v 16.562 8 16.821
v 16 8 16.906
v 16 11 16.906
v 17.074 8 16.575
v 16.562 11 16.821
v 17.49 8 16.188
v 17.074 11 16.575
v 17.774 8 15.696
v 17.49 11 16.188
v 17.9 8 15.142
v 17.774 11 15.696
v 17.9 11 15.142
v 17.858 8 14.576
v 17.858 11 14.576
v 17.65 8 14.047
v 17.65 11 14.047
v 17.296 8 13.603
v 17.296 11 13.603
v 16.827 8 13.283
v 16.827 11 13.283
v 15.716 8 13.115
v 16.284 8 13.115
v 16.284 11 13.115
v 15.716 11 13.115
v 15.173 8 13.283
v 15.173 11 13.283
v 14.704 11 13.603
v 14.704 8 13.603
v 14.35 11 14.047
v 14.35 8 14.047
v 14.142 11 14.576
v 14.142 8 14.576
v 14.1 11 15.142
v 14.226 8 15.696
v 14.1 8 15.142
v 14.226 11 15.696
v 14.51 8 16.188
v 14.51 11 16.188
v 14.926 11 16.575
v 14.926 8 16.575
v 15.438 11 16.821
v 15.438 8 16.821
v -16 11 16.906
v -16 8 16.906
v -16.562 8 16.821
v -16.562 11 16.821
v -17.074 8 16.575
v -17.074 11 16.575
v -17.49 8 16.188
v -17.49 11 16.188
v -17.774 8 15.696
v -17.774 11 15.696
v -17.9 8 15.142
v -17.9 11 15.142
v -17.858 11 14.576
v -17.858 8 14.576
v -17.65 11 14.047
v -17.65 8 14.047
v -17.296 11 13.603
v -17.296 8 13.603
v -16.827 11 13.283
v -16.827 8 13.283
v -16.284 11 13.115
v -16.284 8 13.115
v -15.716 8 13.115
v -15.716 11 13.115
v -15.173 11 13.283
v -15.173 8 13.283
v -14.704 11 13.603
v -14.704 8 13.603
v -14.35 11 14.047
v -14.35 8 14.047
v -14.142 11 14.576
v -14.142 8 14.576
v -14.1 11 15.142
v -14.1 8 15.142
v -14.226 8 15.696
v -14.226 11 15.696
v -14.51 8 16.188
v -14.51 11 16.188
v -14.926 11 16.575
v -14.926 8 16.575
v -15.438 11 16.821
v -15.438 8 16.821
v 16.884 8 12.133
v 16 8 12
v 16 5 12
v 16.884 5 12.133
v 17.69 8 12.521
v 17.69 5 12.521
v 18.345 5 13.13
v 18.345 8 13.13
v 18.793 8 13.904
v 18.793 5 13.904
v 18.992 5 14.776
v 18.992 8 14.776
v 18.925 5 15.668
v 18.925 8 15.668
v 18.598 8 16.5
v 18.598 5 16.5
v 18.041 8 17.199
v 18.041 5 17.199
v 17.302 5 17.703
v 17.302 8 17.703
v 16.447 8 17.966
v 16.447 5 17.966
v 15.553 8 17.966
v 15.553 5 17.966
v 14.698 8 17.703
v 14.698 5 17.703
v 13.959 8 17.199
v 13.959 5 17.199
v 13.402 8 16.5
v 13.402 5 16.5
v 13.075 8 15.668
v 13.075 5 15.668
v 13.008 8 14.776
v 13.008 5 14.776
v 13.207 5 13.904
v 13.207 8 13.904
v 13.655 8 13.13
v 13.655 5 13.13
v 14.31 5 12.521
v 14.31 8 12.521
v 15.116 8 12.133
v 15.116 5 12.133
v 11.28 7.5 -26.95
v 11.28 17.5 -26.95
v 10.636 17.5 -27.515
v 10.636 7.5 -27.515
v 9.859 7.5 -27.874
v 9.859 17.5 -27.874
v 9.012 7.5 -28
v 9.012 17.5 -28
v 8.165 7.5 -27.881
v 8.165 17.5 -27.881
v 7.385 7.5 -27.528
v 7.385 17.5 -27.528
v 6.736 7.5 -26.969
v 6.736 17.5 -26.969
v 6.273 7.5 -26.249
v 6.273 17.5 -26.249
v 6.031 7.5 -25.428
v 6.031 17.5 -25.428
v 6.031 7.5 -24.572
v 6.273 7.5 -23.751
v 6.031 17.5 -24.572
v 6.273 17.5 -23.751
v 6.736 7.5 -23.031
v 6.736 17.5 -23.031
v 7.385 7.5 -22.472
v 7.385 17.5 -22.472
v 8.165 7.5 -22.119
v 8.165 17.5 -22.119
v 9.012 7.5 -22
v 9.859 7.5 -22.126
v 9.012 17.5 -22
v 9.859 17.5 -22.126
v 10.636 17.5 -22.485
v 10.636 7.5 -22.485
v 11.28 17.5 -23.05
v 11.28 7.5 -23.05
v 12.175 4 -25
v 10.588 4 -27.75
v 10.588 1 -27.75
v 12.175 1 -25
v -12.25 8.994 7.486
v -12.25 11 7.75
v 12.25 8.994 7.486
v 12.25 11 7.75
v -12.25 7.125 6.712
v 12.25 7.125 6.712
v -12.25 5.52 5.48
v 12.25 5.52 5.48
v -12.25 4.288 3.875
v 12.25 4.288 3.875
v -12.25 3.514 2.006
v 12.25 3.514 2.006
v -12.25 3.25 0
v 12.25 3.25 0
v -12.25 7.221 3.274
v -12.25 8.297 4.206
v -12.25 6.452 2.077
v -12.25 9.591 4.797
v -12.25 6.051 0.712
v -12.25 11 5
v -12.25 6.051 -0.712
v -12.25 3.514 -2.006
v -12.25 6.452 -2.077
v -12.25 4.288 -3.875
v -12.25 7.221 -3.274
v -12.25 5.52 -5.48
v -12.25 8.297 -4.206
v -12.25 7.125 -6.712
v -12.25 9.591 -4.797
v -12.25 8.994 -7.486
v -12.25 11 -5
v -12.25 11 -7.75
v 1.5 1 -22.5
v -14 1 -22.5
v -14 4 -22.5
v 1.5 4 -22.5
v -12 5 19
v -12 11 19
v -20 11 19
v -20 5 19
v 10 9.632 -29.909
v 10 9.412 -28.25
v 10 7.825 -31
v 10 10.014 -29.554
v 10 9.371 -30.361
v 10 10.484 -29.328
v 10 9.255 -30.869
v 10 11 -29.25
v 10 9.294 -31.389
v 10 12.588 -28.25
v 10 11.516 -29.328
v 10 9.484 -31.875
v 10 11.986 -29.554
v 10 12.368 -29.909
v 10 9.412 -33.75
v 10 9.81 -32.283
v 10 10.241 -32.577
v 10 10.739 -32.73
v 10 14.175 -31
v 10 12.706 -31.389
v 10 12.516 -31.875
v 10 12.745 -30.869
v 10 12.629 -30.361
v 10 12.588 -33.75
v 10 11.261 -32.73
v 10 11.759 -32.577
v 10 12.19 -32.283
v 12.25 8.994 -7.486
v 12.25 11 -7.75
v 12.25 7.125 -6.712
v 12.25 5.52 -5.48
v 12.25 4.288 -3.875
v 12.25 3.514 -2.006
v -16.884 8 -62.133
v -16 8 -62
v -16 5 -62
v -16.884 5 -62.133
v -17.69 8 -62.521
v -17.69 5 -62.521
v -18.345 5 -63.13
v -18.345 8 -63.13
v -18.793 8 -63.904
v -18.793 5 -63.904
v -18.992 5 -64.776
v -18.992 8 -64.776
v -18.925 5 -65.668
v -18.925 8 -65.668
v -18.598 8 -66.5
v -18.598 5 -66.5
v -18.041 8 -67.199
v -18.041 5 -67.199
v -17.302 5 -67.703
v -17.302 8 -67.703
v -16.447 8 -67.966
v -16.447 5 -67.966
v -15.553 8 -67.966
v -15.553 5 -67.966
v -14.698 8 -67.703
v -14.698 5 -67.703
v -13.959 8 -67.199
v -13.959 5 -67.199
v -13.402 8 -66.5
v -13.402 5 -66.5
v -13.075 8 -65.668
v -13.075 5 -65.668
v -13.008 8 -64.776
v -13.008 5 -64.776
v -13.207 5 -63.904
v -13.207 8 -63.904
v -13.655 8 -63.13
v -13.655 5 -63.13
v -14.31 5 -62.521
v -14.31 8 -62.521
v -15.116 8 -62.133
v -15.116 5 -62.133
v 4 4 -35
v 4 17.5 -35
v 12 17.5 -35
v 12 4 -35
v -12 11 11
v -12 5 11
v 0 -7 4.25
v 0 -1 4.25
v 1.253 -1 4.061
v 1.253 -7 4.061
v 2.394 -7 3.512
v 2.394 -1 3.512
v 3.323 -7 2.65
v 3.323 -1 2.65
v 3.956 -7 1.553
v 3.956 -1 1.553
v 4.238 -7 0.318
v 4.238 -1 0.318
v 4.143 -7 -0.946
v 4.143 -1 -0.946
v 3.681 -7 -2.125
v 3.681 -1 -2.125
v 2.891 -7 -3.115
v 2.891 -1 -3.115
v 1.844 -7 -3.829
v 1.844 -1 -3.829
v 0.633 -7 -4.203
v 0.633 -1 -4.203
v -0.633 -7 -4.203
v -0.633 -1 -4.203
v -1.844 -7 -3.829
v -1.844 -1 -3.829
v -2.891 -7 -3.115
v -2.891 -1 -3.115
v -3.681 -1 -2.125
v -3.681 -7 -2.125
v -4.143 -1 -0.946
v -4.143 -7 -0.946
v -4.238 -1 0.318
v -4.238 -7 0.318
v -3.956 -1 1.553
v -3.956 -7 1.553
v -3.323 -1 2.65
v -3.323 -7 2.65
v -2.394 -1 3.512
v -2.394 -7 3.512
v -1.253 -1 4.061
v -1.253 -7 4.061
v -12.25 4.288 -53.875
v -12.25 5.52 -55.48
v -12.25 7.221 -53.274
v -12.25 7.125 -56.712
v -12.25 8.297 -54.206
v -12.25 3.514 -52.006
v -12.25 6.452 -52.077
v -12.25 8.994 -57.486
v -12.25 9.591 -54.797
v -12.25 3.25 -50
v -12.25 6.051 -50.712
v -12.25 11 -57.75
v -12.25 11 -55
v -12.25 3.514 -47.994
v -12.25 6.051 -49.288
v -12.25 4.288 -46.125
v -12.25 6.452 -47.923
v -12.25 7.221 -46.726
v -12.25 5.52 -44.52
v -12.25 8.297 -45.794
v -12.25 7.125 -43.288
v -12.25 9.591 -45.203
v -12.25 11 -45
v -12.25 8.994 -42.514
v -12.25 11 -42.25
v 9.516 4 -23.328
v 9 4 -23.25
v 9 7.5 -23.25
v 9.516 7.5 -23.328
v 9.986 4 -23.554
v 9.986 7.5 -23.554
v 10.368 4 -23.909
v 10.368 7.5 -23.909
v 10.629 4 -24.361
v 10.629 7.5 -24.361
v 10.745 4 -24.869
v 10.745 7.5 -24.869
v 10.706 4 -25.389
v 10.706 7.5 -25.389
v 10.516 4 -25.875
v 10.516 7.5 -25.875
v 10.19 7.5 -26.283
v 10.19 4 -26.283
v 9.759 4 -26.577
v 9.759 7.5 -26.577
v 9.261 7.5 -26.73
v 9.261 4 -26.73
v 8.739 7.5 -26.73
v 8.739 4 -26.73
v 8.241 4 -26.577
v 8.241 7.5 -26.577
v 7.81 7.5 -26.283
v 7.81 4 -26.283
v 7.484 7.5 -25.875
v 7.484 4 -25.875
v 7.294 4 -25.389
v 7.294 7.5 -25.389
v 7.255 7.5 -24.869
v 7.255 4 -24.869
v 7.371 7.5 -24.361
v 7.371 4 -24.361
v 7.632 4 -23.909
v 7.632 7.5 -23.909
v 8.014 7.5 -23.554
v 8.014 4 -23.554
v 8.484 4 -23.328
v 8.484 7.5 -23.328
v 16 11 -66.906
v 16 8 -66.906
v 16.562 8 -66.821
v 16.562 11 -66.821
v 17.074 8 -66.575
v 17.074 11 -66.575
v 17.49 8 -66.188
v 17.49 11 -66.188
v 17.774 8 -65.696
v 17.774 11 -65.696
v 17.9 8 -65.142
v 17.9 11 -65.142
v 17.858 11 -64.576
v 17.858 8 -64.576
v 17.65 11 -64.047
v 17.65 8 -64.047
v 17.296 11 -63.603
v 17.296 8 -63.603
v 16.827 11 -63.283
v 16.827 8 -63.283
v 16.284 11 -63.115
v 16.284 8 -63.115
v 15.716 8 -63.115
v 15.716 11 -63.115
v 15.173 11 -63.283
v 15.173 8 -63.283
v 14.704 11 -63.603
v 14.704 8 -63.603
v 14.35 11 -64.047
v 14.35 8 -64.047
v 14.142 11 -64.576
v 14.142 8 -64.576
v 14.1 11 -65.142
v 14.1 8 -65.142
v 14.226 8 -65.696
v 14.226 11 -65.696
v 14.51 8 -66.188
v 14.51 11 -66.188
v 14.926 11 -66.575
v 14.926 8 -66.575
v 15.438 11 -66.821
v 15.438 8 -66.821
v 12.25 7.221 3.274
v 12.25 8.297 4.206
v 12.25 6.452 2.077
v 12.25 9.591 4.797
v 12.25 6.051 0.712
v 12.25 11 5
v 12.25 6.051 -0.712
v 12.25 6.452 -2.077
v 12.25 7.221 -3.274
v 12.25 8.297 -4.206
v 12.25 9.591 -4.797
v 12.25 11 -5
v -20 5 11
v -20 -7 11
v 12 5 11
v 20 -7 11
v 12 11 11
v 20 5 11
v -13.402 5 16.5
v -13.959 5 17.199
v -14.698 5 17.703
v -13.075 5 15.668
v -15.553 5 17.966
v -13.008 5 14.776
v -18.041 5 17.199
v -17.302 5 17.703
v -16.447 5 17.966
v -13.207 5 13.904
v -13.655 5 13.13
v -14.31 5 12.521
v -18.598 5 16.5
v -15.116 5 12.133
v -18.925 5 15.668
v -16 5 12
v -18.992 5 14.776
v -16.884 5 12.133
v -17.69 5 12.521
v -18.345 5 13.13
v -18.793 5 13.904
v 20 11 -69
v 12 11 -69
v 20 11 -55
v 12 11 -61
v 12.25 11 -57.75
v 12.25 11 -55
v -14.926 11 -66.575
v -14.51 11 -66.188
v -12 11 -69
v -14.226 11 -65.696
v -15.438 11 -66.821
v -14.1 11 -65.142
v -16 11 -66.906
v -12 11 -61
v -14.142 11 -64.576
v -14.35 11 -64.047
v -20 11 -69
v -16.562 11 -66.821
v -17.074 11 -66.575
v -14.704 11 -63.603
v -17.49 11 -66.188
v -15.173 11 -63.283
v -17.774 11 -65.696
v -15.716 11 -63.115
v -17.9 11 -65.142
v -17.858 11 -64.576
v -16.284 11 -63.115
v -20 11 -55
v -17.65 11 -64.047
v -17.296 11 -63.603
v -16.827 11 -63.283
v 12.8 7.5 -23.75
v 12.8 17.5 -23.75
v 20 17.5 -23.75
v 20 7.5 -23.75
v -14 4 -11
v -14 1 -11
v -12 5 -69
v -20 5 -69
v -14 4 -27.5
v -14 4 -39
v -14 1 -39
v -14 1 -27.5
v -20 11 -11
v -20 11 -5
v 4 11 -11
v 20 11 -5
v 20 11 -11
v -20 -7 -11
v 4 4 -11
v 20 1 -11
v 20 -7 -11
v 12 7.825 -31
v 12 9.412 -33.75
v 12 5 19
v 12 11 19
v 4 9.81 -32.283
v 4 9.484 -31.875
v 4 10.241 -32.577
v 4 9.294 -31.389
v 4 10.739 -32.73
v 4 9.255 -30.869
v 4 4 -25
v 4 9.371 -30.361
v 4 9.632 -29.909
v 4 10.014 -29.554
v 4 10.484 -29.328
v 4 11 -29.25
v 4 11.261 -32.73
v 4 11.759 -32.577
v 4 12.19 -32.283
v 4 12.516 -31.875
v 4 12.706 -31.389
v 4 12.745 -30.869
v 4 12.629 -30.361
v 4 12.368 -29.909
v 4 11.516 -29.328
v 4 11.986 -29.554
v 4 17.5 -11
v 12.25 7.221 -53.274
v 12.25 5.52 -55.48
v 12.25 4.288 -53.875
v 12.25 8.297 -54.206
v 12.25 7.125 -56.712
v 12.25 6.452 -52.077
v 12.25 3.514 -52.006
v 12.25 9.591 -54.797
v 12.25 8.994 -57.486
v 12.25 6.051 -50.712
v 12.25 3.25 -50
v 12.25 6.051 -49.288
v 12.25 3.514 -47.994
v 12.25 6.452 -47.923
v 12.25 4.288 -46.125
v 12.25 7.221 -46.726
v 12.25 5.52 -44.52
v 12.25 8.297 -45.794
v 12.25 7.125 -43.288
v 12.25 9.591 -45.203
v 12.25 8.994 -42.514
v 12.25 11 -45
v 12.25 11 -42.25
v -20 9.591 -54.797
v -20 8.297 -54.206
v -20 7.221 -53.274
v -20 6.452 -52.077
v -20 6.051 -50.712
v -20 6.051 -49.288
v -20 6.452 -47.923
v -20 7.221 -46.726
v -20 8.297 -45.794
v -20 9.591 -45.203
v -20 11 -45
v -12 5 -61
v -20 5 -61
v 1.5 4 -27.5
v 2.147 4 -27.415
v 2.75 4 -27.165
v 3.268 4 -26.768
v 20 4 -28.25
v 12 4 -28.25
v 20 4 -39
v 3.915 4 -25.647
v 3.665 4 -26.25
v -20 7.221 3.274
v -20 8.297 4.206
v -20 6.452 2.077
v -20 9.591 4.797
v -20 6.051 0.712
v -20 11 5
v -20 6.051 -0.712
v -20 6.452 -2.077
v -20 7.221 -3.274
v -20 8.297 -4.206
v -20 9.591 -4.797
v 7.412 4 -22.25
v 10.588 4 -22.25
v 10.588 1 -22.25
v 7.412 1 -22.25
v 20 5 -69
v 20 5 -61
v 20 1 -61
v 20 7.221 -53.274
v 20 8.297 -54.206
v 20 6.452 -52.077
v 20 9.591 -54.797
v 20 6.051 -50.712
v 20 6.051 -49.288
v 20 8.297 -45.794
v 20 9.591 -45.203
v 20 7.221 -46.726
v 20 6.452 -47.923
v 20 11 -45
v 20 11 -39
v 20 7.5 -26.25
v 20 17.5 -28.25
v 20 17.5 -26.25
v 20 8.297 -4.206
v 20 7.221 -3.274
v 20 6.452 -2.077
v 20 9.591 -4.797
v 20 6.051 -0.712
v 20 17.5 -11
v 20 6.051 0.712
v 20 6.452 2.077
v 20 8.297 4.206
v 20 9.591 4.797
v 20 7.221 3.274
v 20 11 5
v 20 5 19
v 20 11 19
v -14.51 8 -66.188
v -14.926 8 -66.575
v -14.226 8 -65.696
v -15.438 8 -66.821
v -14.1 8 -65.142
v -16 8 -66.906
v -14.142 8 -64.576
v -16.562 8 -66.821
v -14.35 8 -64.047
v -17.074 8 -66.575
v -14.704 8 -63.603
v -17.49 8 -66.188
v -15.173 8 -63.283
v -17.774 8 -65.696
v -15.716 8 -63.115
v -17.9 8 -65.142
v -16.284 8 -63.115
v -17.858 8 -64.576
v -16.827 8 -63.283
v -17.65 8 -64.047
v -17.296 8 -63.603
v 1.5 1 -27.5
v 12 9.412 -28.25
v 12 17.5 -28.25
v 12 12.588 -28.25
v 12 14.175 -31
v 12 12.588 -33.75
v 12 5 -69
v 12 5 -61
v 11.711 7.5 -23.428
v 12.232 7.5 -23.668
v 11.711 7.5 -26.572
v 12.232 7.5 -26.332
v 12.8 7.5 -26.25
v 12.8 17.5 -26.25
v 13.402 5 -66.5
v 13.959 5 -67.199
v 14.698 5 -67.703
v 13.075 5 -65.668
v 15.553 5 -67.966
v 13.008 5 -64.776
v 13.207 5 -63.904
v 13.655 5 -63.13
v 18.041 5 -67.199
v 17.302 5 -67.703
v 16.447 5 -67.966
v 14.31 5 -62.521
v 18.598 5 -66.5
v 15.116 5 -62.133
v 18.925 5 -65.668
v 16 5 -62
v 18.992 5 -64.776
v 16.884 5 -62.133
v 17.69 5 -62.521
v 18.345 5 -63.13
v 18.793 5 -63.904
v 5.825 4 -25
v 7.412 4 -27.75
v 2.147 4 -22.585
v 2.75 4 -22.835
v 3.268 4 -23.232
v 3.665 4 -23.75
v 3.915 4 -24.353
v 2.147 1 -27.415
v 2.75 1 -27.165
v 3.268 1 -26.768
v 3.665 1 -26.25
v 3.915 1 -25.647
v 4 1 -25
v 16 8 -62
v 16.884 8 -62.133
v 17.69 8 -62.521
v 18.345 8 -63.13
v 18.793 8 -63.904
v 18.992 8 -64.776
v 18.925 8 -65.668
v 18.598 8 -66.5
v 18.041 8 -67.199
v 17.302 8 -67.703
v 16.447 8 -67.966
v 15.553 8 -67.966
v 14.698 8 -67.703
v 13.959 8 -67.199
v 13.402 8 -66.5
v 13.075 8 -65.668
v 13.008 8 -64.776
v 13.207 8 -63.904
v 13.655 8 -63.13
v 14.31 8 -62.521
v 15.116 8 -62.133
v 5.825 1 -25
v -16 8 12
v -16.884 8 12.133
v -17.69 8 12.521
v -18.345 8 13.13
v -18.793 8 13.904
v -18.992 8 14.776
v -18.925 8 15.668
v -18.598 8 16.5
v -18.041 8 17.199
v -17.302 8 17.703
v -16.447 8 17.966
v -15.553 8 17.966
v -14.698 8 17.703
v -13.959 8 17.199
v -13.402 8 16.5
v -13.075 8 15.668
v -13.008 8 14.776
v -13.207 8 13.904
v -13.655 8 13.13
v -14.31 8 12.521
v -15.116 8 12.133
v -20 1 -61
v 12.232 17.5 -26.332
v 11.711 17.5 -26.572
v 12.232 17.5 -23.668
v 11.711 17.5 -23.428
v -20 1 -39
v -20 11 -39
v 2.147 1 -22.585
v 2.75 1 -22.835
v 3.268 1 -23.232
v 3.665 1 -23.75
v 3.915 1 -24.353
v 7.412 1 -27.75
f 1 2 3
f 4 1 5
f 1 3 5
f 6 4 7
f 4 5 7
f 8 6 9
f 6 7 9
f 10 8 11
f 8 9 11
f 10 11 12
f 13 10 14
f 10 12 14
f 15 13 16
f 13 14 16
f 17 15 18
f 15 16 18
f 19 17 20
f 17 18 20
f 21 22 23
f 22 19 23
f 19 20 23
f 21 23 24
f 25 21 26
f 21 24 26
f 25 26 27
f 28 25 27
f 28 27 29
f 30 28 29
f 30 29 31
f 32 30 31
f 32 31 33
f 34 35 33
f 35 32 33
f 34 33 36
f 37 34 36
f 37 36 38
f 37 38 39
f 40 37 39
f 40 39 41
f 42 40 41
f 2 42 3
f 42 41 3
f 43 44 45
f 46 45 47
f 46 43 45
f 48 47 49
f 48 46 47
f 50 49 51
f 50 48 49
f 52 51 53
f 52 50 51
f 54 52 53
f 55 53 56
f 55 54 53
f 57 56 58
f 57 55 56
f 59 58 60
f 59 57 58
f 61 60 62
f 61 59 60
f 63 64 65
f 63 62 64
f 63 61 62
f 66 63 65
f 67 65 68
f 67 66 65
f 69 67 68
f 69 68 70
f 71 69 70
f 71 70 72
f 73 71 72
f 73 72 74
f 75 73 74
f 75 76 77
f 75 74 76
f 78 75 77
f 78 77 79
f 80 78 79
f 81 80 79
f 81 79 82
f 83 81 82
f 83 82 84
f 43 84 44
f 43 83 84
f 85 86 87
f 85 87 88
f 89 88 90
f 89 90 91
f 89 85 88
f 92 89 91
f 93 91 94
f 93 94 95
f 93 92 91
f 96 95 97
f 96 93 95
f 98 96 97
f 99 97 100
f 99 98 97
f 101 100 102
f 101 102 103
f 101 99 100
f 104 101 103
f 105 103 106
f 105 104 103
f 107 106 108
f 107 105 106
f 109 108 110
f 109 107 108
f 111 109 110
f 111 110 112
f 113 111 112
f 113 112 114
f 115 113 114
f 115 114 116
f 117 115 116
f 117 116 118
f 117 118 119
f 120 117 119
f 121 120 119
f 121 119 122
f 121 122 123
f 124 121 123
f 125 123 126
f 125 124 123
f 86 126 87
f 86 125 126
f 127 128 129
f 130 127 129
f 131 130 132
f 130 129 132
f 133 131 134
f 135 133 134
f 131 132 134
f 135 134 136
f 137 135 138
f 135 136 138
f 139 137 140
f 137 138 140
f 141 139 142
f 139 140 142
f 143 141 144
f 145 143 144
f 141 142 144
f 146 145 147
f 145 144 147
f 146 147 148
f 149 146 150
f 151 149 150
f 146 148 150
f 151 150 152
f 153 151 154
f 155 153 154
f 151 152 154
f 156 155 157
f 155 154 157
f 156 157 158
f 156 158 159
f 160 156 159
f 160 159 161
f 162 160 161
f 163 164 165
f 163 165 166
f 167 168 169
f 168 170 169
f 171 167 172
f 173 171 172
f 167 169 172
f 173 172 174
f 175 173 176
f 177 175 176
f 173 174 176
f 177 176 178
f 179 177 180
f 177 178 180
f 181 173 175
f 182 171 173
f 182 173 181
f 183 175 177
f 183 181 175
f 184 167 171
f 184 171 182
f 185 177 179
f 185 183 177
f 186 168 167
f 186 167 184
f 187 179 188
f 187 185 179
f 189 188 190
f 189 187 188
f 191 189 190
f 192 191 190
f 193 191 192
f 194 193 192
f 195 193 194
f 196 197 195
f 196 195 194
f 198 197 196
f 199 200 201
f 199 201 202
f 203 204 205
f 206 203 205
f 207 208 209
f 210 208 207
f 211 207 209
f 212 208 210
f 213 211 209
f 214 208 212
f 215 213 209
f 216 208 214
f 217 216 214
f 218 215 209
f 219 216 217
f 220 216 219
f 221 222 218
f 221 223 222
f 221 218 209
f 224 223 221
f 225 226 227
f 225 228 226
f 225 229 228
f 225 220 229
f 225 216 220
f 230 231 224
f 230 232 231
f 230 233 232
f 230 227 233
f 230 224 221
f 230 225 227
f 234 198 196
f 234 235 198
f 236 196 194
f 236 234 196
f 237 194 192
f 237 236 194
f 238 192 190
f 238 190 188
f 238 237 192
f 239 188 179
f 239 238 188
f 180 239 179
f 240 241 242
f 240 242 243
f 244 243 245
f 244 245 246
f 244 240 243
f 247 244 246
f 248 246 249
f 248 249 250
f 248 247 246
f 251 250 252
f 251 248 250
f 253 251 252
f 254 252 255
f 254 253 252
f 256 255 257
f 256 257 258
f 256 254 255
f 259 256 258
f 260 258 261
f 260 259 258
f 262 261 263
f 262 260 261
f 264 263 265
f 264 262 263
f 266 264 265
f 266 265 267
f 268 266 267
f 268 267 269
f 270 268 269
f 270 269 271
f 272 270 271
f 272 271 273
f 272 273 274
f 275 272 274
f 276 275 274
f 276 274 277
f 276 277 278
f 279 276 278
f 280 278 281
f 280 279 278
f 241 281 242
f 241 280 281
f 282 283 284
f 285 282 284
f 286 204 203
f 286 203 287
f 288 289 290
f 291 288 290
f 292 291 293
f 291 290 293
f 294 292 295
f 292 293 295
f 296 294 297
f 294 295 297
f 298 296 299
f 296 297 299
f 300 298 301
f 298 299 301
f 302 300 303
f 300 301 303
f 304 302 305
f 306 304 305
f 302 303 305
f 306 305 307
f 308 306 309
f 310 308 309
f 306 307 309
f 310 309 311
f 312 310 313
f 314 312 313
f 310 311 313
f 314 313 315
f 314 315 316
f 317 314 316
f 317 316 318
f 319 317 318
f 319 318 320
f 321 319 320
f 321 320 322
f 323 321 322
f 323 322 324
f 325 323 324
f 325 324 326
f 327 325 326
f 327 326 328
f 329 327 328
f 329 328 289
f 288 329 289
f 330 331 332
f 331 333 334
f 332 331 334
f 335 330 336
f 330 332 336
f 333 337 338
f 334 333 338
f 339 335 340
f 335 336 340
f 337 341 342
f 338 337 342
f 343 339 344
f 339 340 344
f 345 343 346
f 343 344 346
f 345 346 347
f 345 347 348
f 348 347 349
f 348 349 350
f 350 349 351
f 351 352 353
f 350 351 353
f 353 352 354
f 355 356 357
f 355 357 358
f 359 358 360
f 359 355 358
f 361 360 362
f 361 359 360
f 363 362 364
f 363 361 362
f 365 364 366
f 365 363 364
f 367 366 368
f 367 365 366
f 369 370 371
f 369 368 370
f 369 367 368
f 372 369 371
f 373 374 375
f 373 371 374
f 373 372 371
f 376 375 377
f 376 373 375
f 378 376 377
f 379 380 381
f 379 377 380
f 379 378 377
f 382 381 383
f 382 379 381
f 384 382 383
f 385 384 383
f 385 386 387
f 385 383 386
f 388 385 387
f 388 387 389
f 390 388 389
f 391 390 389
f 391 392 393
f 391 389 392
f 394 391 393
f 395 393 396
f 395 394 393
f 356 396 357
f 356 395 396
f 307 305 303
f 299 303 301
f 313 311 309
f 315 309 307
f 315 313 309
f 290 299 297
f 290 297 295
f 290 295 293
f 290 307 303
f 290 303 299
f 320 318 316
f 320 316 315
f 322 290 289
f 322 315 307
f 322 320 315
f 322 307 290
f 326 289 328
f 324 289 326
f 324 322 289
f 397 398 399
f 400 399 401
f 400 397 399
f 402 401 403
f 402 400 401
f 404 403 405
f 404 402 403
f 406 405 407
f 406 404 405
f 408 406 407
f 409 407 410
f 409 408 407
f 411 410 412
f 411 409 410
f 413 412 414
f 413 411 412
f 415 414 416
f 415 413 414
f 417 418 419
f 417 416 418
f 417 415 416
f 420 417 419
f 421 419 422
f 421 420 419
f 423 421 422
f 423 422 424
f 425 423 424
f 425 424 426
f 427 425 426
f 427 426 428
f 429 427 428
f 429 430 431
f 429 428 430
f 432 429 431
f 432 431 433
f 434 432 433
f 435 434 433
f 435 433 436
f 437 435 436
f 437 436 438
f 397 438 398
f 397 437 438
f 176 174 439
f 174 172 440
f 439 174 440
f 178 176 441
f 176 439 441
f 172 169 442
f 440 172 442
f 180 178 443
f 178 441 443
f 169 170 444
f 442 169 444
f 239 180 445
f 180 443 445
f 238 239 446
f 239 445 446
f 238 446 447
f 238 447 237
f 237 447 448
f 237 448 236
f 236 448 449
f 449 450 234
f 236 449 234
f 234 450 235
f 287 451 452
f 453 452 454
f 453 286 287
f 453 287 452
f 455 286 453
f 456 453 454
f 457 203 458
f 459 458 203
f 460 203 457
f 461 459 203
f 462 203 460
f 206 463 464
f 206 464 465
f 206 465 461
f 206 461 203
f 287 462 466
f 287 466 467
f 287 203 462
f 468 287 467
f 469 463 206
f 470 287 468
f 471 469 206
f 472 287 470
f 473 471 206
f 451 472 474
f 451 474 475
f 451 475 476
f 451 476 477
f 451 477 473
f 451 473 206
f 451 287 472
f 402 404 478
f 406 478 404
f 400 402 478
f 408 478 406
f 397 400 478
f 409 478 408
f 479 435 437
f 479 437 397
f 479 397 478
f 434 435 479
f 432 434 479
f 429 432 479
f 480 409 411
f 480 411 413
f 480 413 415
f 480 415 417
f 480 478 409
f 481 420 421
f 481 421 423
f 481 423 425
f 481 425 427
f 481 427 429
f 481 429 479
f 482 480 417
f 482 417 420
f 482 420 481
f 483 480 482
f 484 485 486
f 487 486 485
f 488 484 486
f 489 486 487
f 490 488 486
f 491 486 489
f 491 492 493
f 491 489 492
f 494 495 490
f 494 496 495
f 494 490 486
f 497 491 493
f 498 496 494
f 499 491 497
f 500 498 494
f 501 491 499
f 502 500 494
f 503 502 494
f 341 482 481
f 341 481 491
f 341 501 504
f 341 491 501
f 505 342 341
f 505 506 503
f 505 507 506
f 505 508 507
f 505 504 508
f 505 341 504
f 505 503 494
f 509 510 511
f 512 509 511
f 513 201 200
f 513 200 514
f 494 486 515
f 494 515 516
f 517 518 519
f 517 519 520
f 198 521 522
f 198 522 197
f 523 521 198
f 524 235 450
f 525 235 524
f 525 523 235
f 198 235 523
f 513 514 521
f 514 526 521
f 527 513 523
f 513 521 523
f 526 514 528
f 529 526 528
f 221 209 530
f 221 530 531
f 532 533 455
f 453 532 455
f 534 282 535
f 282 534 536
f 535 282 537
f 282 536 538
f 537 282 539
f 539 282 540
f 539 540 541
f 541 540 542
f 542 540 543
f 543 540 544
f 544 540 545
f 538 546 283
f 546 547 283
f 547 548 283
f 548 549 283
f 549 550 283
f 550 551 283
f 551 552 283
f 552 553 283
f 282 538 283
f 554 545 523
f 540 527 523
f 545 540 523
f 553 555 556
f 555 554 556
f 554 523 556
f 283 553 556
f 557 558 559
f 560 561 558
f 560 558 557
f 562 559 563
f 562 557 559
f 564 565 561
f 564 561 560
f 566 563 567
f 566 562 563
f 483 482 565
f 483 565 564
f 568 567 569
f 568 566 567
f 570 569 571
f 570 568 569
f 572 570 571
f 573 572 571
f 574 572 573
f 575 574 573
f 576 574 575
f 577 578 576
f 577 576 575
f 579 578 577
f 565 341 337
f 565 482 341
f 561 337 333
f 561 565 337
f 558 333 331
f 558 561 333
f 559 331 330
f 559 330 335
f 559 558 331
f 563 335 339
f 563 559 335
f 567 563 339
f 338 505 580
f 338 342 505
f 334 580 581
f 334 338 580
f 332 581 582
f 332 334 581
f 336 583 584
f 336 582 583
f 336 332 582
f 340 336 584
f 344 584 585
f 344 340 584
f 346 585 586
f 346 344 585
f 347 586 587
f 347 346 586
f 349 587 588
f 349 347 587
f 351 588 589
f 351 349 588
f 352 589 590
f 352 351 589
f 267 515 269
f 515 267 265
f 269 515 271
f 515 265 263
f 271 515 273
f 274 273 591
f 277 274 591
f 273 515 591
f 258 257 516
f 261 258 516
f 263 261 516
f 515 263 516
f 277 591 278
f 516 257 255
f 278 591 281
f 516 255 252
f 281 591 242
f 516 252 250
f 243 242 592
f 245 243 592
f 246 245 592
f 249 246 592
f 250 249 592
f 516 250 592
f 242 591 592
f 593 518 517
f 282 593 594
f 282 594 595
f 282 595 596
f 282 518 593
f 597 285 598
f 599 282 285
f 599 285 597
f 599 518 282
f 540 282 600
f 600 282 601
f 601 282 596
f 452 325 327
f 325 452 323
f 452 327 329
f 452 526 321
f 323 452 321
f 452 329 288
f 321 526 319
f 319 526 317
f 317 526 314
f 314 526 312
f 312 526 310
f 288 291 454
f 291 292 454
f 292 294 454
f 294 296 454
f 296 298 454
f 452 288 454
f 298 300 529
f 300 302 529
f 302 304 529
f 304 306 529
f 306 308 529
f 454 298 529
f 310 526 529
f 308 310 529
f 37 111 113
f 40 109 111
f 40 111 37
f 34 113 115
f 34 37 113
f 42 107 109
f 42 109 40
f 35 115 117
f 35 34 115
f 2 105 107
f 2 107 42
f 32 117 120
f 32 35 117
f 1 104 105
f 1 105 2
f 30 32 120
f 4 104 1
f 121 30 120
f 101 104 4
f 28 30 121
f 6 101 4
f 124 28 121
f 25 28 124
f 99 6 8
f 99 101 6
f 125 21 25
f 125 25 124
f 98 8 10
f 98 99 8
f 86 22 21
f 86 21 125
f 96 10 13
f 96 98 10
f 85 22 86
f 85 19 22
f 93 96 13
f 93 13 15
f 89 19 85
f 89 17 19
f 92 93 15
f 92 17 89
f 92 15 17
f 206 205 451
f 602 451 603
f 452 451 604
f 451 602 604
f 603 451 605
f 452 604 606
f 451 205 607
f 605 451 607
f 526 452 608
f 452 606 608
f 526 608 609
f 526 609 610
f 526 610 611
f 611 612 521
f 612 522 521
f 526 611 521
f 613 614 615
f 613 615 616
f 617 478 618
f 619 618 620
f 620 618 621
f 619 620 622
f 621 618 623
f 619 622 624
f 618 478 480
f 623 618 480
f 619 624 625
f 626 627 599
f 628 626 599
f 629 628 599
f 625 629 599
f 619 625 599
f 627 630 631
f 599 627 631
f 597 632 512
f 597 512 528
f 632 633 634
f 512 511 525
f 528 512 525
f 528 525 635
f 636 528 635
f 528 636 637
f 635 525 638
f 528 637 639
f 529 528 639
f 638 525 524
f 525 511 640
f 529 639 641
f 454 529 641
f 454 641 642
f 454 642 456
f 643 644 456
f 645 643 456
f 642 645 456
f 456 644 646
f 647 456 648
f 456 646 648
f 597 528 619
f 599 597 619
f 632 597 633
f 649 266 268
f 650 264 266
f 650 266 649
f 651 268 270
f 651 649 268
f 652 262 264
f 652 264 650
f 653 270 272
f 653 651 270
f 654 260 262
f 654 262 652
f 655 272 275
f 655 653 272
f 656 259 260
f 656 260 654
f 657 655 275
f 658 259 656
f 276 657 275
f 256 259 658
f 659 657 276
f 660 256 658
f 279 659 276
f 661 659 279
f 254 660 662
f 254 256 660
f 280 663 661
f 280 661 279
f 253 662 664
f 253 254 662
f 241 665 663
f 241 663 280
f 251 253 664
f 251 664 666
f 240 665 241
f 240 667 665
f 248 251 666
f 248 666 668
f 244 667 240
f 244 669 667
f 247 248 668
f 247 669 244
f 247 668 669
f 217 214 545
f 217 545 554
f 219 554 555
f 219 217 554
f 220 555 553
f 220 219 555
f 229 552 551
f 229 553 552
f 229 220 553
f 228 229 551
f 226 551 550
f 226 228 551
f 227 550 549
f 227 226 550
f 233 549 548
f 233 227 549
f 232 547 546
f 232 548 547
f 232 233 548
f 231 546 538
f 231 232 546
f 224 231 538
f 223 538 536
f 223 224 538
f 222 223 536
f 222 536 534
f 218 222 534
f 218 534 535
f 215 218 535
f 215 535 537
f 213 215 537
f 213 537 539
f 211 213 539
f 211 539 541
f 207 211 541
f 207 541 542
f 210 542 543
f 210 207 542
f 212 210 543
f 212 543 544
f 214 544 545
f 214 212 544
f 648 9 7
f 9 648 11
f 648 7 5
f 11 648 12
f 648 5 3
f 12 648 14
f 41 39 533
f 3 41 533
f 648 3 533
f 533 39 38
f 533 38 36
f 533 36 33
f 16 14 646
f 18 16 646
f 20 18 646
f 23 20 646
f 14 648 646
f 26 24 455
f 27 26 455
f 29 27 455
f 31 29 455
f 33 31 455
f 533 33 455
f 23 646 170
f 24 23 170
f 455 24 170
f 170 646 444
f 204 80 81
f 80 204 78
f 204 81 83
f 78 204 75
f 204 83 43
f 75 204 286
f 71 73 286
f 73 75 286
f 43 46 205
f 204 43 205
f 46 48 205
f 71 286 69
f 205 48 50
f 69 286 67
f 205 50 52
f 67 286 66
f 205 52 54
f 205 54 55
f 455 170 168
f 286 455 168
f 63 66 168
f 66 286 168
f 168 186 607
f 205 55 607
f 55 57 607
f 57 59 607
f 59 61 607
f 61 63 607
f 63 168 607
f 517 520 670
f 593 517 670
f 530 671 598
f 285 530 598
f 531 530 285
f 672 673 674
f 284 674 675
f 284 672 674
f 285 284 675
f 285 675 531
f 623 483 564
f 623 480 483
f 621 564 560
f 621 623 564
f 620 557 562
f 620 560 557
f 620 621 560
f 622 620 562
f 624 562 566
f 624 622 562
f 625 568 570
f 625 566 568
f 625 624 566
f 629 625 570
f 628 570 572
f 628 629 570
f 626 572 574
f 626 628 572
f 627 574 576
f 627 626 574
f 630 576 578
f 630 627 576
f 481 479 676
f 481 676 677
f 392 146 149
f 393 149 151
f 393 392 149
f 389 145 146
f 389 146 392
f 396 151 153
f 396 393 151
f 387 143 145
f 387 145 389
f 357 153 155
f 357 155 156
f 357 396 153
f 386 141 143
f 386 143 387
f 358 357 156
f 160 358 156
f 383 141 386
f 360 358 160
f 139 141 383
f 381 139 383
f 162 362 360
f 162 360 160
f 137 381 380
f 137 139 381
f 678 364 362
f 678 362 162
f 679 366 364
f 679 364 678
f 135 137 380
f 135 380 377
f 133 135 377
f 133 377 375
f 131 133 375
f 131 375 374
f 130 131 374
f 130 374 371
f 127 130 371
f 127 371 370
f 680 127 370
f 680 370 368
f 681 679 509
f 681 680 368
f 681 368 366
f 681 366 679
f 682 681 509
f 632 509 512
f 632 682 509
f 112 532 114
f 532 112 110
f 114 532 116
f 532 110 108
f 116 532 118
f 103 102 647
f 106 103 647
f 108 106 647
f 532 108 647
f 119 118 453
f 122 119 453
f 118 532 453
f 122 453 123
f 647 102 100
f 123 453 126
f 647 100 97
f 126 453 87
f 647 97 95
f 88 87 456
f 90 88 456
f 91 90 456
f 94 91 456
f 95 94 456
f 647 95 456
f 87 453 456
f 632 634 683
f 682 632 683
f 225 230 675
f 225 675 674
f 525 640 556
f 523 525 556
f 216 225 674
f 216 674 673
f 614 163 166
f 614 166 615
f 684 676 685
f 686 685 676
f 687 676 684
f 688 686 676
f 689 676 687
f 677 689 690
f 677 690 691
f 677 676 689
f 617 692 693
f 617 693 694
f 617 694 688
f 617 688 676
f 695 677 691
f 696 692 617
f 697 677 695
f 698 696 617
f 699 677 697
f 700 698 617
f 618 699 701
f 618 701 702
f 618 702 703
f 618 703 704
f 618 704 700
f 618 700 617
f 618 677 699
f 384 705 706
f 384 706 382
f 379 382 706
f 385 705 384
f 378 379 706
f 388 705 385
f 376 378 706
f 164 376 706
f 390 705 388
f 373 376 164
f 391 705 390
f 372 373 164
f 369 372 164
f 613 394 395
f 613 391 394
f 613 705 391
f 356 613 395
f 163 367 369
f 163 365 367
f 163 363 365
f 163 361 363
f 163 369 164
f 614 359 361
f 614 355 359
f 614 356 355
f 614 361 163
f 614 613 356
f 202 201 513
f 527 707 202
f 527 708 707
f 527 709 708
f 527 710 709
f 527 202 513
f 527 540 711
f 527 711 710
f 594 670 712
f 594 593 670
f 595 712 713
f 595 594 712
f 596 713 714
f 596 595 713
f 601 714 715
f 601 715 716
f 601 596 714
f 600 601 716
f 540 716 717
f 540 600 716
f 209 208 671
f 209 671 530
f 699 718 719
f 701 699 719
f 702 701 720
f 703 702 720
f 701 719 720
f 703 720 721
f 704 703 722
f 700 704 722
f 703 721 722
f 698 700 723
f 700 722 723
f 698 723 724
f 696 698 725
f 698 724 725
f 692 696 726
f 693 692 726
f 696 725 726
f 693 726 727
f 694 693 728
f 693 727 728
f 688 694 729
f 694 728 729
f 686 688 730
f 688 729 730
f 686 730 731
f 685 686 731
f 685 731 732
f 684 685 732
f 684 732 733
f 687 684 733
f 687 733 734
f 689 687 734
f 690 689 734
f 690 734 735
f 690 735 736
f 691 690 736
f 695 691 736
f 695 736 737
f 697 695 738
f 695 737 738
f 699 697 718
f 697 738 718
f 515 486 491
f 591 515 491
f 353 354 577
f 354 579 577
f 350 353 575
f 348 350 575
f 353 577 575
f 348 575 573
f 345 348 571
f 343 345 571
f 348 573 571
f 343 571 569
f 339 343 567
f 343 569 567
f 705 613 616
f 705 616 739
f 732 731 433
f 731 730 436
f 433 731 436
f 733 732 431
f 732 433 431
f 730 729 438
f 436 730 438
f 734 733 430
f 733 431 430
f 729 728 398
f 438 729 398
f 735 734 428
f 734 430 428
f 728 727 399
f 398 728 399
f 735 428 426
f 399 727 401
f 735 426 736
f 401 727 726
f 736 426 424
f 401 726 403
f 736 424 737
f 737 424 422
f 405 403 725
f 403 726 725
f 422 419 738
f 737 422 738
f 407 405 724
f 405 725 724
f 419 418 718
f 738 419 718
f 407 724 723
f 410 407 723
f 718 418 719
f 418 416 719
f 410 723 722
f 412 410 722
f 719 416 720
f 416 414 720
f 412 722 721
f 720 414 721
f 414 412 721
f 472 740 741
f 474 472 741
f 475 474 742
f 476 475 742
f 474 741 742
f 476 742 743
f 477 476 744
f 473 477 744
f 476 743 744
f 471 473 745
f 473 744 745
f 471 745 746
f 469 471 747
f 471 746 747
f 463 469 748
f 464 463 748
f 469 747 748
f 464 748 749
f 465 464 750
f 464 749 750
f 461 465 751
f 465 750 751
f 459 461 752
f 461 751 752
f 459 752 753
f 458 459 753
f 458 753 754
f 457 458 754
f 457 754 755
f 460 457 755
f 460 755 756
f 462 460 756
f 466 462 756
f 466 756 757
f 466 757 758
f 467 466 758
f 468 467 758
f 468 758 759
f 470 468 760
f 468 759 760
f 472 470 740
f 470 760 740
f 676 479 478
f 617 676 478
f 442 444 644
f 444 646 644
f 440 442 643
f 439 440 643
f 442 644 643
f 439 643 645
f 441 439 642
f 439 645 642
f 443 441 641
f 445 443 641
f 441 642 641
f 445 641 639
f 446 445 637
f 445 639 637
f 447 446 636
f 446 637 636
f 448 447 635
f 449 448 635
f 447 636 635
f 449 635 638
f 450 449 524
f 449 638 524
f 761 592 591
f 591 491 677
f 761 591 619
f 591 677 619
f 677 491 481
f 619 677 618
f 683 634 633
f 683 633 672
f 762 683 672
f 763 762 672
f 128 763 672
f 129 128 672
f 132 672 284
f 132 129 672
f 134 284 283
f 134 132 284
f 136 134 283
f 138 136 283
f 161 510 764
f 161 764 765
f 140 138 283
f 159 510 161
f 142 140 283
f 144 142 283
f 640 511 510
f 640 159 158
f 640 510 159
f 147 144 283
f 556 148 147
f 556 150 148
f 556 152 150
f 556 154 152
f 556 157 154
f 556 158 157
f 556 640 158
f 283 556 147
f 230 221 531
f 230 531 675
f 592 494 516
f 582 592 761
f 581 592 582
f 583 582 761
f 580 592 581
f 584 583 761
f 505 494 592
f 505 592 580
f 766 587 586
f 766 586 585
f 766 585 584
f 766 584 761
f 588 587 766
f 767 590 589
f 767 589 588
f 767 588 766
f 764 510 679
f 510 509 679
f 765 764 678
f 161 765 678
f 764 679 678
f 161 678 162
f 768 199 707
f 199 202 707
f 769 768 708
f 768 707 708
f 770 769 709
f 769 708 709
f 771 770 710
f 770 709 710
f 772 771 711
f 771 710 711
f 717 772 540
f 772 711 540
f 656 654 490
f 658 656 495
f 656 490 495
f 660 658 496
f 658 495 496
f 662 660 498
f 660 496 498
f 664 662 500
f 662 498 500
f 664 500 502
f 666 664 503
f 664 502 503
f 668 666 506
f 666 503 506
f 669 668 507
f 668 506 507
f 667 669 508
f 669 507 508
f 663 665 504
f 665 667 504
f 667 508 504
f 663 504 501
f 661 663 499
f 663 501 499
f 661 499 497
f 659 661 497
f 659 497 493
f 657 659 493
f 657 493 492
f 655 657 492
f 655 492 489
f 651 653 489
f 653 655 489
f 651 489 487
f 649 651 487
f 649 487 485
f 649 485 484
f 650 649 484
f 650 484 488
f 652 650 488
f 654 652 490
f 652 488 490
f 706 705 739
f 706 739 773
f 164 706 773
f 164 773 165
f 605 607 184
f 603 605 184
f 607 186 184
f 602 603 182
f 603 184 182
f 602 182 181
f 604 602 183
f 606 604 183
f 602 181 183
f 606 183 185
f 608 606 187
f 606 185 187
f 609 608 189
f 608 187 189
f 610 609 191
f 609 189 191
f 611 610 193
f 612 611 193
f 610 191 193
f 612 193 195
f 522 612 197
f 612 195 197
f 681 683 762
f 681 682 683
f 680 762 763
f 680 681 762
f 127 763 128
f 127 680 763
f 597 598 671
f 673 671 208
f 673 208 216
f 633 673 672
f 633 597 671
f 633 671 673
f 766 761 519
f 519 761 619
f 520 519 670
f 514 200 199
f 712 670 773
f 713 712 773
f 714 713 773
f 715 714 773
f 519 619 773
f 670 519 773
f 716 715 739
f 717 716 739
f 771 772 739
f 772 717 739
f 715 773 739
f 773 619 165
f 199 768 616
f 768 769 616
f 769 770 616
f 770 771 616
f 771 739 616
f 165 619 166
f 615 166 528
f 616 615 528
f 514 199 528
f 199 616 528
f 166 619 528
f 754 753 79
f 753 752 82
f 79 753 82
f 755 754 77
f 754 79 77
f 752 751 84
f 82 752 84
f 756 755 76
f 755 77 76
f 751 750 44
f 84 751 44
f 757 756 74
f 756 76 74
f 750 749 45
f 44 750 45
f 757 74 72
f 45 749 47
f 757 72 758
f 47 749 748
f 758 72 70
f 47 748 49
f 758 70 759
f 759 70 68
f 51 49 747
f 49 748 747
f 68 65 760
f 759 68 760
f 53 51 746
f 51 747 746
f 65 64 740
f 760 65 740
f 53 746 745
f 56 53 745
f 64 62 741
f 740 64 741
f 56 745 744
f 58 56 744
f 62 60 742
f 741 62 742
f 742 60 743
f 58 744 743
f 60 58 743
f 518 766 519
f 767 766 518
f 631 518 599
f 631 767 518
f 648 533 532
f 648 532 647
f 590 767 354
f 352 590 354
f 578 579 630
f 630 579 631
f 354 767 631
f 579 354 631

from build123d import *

# Parameters (mm, degrees)
SKETCH1_W                  = 40
SKETCH1_H                  = 22
BOSS_EXTRUDE1_DEPTH        = 11
SKETCH2_W                  = 40
SKETCH2_H                  = 22
SKETCH2_R                  = 4.25
BOSS_EXTRUDE2_DEPTH        = 7
SKETCH3_W                  = 24.5
SKETCH3_H                  = 15.5
CUT_EXTRUDE1_DEPTH         = 7.75
FILLET1_R                  = 7.75
SKETCH4_R                  = 5
CUT_EXTRUDE2_DEPTH         = 36.805900352
SKETCH5_W                  = 8
SKETCH5_H                  = 8
SKETCH5_R                  = 1.905800151
BOSS_EXTRUDE3_DEPTH        = 6
CUT_EXTRUDE3_START         = -3
SKETCH6_R                  = 3
SKETCH6_R_2                = 1.905800151
CUT_EXTRUDE3_DEPTH         = 3
SKETCH7_W                  = 16
SKETCH7_H                  = 16.5
BOSS_EXTRUDE5_DEPTH        = 28
MIRROR14_COPY_1_SKETCH_W   = 8
MIRROR14_COPY_1_SKETCH_H   = 8
MIRROR14_COPY_1_SKETCH_R   = 1.905800151
MIRROR14_COPY_1_DEPTH      = 6
MIRROR14_START             = -3
MIRROR14_COPY_2_SKETCH_R   = 3
MIRROR14_COPY_2_SKETCH_R_2 = 1.905800151
MIRROR14_COPY_2_DEPTH      = 3
FILLET1_OF_MIRROR14_R      = 7.75
SKETCH9_W                  = 28
SKETCH9_H                  = 3
BOSS_EXTRUDE6_DEPTH        = 18
CUT_EXTRUDE4_DEPTH         = 10
CUT_EXTRUDE5_DEPTH         = 74.288812243
CUT_EXTRUDE5_DEPTH_BACK    = 74.288812243
SKETCH11_R                 = 1.75
CUT_EXTRUDE6_DEPTH         = 76.121568141
CUT_EXTRUDE6_DEPTH_BACK    = 76.121568141
SKETCH12_R                 = 1.75
FILLET2_R                  = 2
CUT_EXTRUDE12_START        = -3
SKETCH17_R                 = 1.75
CUT_EXTRUDE12_DEPTH        = 3
CUT_EXTRUDE13_DEPTH        = 74.097537578
CUT_EXTRUDE13_DEPTH_BACK   = 74.097537578
SKETCH18_W                 = 18
SKETCH18_H                 = 5
FILLET3_R                  = 2.5
CUT_EXTRUDE14_DEPTH        = 74.710582687
CUT_EXTRUDE15_START        = -10
SKETCH21_R                 = 1.75
CUT_EXTRUDE15_DEPTH        = 10
SKETCH20_W                 = 36.163748027
SKETCH20_H                 = 4
CUT_EXTRUDE16_DEPTH        = 13.5
SKETCH22_W                 = 6.75
SKETCH22_H                 = 13.5
CUT_EXTRUDE18_DEPTH        = 8
SKETCH23_R                 = 4.25
BOSS_EXTRUDE8_DEPTH        = 1


with BuildPart() as part:
    # Sketch1 → Boss-Extrude1 (new body)
    with BuildSketch(Plane(origin=(0, 0, 0), x_dir=(1, 0, 0), z_dir=(0, 1, 0))):
        Rectangle(SKETCH1_W, SKETCH1_H)
    boss_extrude1 = extrude(amount=BOSS_EXTRUDE1_DEPTH)

    # Sketch2 → Boss-Extrude2 (add)
    with BuildSketch(Plane(origin=(0, 0, 0), x_dir=(1, 0, 0), z_dir=(0, 1, 0))):
        Rectangle(SKETCH2_W, SKETCH2_H)
        with Locations(Location((0, 0, 0), (0, 0, 270))):
            Circle(SKETCH2_R, mode=Mode.SUBTRACT)
    boss_extrude2 = extrude(amount=-BOSS_EXTRUDE2_DEPTH)

    # Sketch3 → Cut-Extrude1 (cut)
    with BuildSketch(Plane(origin=(0, 11, 0), x_dir=(1, 0, 0), z_dir=(0, 1, 0))):
        Rectangle(SKETCH3_W, SKETCH3_H)
    cut_extrude1 = extrude(amount=-CUT_EXTRUDE1_DEPTH, mode=Mode.SUBTRACT)

    # Fillet1
    fillet1_edges = [part.edges().sort_by_distance(p)[0] for p in [
        (0, 3.25, 7.75),
        (0, 3.25, -7.75),
    ]]
    fillet(fillet1_edges, radius=FILLET1_R - 0.0001)  # a hair under: the kernel refuses the full size

    # Sketch4 → Cut-Extrude2 (cut, symmetric)
    with BuildSketch(Plane(origin=(-12.25, 0, 0), x_dir=(0, 0, -1), z_dir=(1, 0, 0))):
        with Locations((0, 11)):
            Circle(SKETCH4_R)
    cut_extrude2 = extrude(amount=CUT_EXTRUDE2_DEPTH, both=True, mode=Mode.SUBTRACT)

    # Sketch5 → Boss-Extrude3 (add)
    with BuildSketch(Plane(origin=(0, 11, 0), x_dir=(1, 0, 0), z_dir=(0, 1, 0))):
        with Locations((16, -15)):
            Rectangle(SKETCH5_W, SKETCH5_H)
        with Locations(Location((16, -15, 0), (0, 0, 270))):
            Circle(SKETCH5_R, mode=Mode.SUBTRACT)
    boss_extrude3 = extrude(amount=-BOSS_EXTRUDE3_DEPTH)

    # Sketch6 → Cut-Extrude3 (cut)
    with BuildSketch(Plane.XZ.offset(-5).offset(CUT_EXTRUDE3_START)):
        with Locations(Location((16, 15, 0), (0, 0, 270))):
            Circle(SKETCH6_R)
        with Locations(Location((16, 15, 0), (0, 0, 90))):
            Circle(SKETCH6_R_2, mode=Mode.SUBTRACT)
    cut_extrude3 = extrude(amount=CUT_EXTRUDE3_DEPTH, mode=Mode.SUBTRACT)

    # Mirror8: Boss-Extrude3, Cut-Extrude3 across plane
    add(boss_extrude3.mirror(Plane(origin=(0, 0, 0), x_dir=(0, 0, 1), z_dir=(1, 0, 0))))
    add(cut_extrude3.mirror(Plane(origin=(0, 0, 0), x_dir=(0, 0, 1), z_dir=(1, 0, 0))), mode=Mode.SUBTRACT)

    # Sketch7 → Boss-Extrude5 (add)
    with BuildSketch(Plane(origin=(0, 0, -11), x_dir=(-1, 0, 0), z_dir=(0, 0, -1))):
        with Locations((-12, 9.25)):
            Rectangle(SKETCH7_W, SKETCH7_H)
    extrude(amount=BOSS_EXTRUDE5_DEPTH)

    # Mirror14: Boss-Extrude1, Boss-Extrude2, Cut-Extrude1, Cut-Extrude2, Boss-Extrude3, Cut-Extrude3 across plane
    add(boss_extrude1.mirror(Plane.XY.offset(-25)))
    add(boss_extrude2.mirror(Plane.XY.offset(-25)))
    add(cut_extrude1.mirror(Plane.XY.offset(-25)), mode=Mode.SUBTRACT)
    add(cut_extrude2.mirror(Plane.XY.offset(-25)), mode=Mode.SUBTRACT)
    add(boss_extrude3.mirror(Plane.XY.offset(-25)))
    add(cut_extrude3.mirror(Plane.XY.offset(-25)), mode=Mode.SUBTRACT)

    # Mirror14 copy 1 sketch → Mirror14 copy 1 (add)
    with BuildSketch(Plane(origin=(0, 11, -50), x_dir=(-1, 0, 0), z_dir=(0, 1, 0))):
        with Locations((16, -15)):
            Rectangle(MIRROR14_COPY_1_SKETCH_W, MIRROR14_COPY_1_SKETCH_H)
        with Locations(Location((16, -15, 0), (0, 0, 270))):
            Circle(MIRROR14_COPY_1_SKETCH_R, mode=Mode.SUBTRACT)
    extrude(amount=-MIRROR14_COPY_1_DEPTH)

    # Mirror14 copy 2 sketch → Mirror14 copy 2 (cut)
    with BuildSketch(Plane(origin=(0, 5, -50), x_dir=(-1, 0, 0), z_dir=(0, -1, 0)).offset(MIRROR14_START)):
        with Locations(Location((16, 15, 0), (0, 0, 270))):
            Circle(MIRROR14_COPY_2_SKETCH_R)
        with Locations(Location((16, 15, 0), (0, 0, 90))):
            Circle(MIRROR14_COPY_2_SKETCH_R_2, mode=Mode.SUBTRACT)
    extrude(amount=MIRROR14_COPY_2_DEPTH, mode=Mode.SUBTRACT)

    # Fillet1 of Mirror14
    fillet1_of_mirror14_edges = [part.edges().sort_by_distance(p)[0] for p in [
        (0, 3.25, -57.75),
        (0, 3.25, -42.25),
    ]]
    fillet(fillet1_of_mirror14_edges, radius=FILLET1_OF_MIRROR14_R - 0.0001)  # a hair under: the kernel refuses the full size

    # Sketch9 → Boss-Extrude6 (add)
    with BuildSketch(Plane.ZY.offset(-4)):
        with Locations((-25, 2.5)):
            Rectangle(SKETCH9_W, SKETCH9_H)
    extrude(amount=BOSS_EXTRUDE6_DEPTH)

    # Sketch10 → Cut-Extrude4 (cut)
    with BuildSketch(Plane(origin=(0, 17.5, 0), x_dir=(1, 0, 0), z_dir=(0, 1, 0))):
        with BuildLine():
            Line((9, 26.25), (9, 23.75))
            Line((9, 23.75), (11.727178029, 23.75))
            ThreePointArc((11.727178029, 23.75), (11.931001031, 24.360286817), (12, 25))
            ThreePointArc((12, 25), (11.931001031, 25.639713183), (11.727178029, 26.25))
            Line((11.727178029, 26.25), (9, 26.25))
        make_face()
        with BuildLine():
            Line((11.727178029, 23.75), (9, 23.75))
            Line((9, 23.75), (9, 26.25))
            Line((9, 26.25), (11.727178029, 26.25))
            ThreePointArc((11.727178029, 26.25), (6, 25), (11.727178029, 23.75))
        make_face()
        with BuildLine():
            ThreePointArc((12, 25), (11.931001031, 24.360286817), (11.727178029, 23.75))
            Line((11.727178029, 23.75), (20, 23.75))
            Line((20, 23.75), (20, 26.25))
            Line((20, 26.25), (11.727178029, 26.25))
            ThreePointArc((11.727178029, 26.25), (11.931001031, 25.639713183), (12, 25))
        make_face()
    extrude(amount=-CUT_EXTRUDE4_DEPTH, mode=Mode.SUBTRACT)

    # Sketch11 → Cut-Extrude5 (cut, two sides: drawn at the far end of the back side and taken through both)
    with BuildSketch(Plane(origin=(0, 7.5, 0), x_dir=(1, 0, 0), z_dir=(0, 1, 0)).offset(-CUT_EXTRUDE5_DEPTH_BACK)):
        with Locations(Location((9, 25, 0), (0, 0, 270))):
            Circle(SKETCH11_R)
    extrude(amount=CUT_EXTRUDE5_DEPTH + CUT_EXTRUDE5_DEPTH_BACK, mode=Mode.SUBTRACT)

    # Sketch12 → Cut-Extrude6 (cut, two sides: drawn at the far end of the back side and taken through both)
    with BuildSketch(Plane.ZY.offset(-4).offset(-CUT_EXTRUDE6_DEPTH_BACK)):
        with Locations((-31, 11)):
            Circle(SKETCH12_R)
    extrude(amount=CUT_EXTRUDE6_DEPTH + CUT_EXTRUDE6_DEPTH_BACK, mode=Mode.SUBTRACT)

    # Fillet2
    fillet2_edges = [part.edges().sort_by_distance(p)[0] for p in [
        (11.727178029, 12.5, -23.75),
        (11.727178029, 12.5, -26.25),
    ]]
    fillet(fillet2_edges, radius=FILLET2_R)

    # Sketch17 → Cut-Extrude12 (cut)
    with BuildSketch(Plane.XZ.offset(-1).offset(CUT_EXTRUDE12_START)):
        Polygon((12.175426481, -25), (10.58771324, -22.25), (7.41228676, -22.25), (5.824573519, -25), (7.41228676, -27.75), (10.58771324, -27.75), align=None)
        with Locations(Location((9, -25, 0), (0, 0, 90))):
            Circle(SKETCH17_R, mode=Mode.SUBTRACT)
    extrude(amount=CUT_EXTRUDE12_DEPTH, mode=Mode.SUBTRACT)

    # Sketch18 → Cut-Extrude13 (cut, two sides: drawn at the far end of the back side and taken through both)
    with BuildSketch(Plane(origin=(0, 4, 0), x_dir=(1, 0, 0), z_dir=(0, 1, 0)).offset(-CUT_EXTRUDE13_DEPTH_BACK)):
        with Locations((-5, 25)):
            Rectangle(SKETCH18_W, SKETCH18_H)
    extrude(amount=CUT_EXTRUDE13_DEPTH + CUT_EXTRUDE13_DEPTH_BACK, mode=Mode.SUBTRACT)

    # Fillet3
    fillet3_edges = [part.edges().sort_by_distance(p)[0] for p in [
        (4, 2.5, -27.5),
        (4, 2.5, -22.5),
    ]]
    fillet(fillet3_edges, radius=FILLET3_R - 0.0001)  # a hair under: the kernel refuses the full size

    # Sketch19 → Cut-Extrude14 (cut, through all)
    with BuildSketch(Plane.XZ.offset(-1)):
        Polygon((20, -61), (20, -39), (-14, -39), (-20, -39), (-20, -61), align=None)
    extrude(amount=CUT_EXTRUDE14_DEPTH, mode=Mode.SUBTRACT)

    # Sketch21 → Cut-Extrude15 (cut)
    with BuildSketch(Plane(origin=(20, 0, 0), x_dir=(0, 0, -1), z_dir=(1, 0, 0)).offset(CUT_EXTRUDE15_START)):
        Polygon((31, 14.175426481), (28.25, 12.58771324), (28.25, 9.41228676), (31, 7.824573519), (33.75, 9.41228676), (33.75, 12.58771324), align=None)
        with Locations((31, 11)):
            Circle(SKETCH21_R, mode=Mode.SUBTRACT)
    extrude(amount=CUT_EXTRUDE15_DEPTH, mode=Mode.SUBTRACT)

    # Sketch20 → Cut-Extrude16 (cut)
    with BuildSketch(Plane(origin=(0, 17.5, 0), x_dir=(1, 0, 0), z_dir=(0, 1, 0))):
        with Locations((22.081874014, 37)):
            Rectangle(SKETCH20_W, SKETCH20_H)
    extrude(amount=-CUT_EXTRUDE16_DEPTH, mode=Mode.SUBTRACT)

    # Sketch22 → Cut-Extrude18 (cut)
    with BuildSketch(Plane(origin=(20, 0, 0), x_dir=(0, 0, -1), z_dir=(1, 0, 0))):
        with Locations((31.625, 10.75)):
            Rectangle(SKETCH22_W, SKETCH22_H)
    extrude(amount=-CUT_EXTRUDE18_DEPTH, mode=Mode.SUBTRACT)

    # Sketch23 → Boss-Extrude8 (add)
    with BuildSketch(Plane.XZ):
        with Locations(Location((0, 0, 0), (0, 0, 90))):
            Circle(SKETCH23_R)
    extrude(amount=BOSS_EXTRUDE8_DEPTH)


solid = part.part
